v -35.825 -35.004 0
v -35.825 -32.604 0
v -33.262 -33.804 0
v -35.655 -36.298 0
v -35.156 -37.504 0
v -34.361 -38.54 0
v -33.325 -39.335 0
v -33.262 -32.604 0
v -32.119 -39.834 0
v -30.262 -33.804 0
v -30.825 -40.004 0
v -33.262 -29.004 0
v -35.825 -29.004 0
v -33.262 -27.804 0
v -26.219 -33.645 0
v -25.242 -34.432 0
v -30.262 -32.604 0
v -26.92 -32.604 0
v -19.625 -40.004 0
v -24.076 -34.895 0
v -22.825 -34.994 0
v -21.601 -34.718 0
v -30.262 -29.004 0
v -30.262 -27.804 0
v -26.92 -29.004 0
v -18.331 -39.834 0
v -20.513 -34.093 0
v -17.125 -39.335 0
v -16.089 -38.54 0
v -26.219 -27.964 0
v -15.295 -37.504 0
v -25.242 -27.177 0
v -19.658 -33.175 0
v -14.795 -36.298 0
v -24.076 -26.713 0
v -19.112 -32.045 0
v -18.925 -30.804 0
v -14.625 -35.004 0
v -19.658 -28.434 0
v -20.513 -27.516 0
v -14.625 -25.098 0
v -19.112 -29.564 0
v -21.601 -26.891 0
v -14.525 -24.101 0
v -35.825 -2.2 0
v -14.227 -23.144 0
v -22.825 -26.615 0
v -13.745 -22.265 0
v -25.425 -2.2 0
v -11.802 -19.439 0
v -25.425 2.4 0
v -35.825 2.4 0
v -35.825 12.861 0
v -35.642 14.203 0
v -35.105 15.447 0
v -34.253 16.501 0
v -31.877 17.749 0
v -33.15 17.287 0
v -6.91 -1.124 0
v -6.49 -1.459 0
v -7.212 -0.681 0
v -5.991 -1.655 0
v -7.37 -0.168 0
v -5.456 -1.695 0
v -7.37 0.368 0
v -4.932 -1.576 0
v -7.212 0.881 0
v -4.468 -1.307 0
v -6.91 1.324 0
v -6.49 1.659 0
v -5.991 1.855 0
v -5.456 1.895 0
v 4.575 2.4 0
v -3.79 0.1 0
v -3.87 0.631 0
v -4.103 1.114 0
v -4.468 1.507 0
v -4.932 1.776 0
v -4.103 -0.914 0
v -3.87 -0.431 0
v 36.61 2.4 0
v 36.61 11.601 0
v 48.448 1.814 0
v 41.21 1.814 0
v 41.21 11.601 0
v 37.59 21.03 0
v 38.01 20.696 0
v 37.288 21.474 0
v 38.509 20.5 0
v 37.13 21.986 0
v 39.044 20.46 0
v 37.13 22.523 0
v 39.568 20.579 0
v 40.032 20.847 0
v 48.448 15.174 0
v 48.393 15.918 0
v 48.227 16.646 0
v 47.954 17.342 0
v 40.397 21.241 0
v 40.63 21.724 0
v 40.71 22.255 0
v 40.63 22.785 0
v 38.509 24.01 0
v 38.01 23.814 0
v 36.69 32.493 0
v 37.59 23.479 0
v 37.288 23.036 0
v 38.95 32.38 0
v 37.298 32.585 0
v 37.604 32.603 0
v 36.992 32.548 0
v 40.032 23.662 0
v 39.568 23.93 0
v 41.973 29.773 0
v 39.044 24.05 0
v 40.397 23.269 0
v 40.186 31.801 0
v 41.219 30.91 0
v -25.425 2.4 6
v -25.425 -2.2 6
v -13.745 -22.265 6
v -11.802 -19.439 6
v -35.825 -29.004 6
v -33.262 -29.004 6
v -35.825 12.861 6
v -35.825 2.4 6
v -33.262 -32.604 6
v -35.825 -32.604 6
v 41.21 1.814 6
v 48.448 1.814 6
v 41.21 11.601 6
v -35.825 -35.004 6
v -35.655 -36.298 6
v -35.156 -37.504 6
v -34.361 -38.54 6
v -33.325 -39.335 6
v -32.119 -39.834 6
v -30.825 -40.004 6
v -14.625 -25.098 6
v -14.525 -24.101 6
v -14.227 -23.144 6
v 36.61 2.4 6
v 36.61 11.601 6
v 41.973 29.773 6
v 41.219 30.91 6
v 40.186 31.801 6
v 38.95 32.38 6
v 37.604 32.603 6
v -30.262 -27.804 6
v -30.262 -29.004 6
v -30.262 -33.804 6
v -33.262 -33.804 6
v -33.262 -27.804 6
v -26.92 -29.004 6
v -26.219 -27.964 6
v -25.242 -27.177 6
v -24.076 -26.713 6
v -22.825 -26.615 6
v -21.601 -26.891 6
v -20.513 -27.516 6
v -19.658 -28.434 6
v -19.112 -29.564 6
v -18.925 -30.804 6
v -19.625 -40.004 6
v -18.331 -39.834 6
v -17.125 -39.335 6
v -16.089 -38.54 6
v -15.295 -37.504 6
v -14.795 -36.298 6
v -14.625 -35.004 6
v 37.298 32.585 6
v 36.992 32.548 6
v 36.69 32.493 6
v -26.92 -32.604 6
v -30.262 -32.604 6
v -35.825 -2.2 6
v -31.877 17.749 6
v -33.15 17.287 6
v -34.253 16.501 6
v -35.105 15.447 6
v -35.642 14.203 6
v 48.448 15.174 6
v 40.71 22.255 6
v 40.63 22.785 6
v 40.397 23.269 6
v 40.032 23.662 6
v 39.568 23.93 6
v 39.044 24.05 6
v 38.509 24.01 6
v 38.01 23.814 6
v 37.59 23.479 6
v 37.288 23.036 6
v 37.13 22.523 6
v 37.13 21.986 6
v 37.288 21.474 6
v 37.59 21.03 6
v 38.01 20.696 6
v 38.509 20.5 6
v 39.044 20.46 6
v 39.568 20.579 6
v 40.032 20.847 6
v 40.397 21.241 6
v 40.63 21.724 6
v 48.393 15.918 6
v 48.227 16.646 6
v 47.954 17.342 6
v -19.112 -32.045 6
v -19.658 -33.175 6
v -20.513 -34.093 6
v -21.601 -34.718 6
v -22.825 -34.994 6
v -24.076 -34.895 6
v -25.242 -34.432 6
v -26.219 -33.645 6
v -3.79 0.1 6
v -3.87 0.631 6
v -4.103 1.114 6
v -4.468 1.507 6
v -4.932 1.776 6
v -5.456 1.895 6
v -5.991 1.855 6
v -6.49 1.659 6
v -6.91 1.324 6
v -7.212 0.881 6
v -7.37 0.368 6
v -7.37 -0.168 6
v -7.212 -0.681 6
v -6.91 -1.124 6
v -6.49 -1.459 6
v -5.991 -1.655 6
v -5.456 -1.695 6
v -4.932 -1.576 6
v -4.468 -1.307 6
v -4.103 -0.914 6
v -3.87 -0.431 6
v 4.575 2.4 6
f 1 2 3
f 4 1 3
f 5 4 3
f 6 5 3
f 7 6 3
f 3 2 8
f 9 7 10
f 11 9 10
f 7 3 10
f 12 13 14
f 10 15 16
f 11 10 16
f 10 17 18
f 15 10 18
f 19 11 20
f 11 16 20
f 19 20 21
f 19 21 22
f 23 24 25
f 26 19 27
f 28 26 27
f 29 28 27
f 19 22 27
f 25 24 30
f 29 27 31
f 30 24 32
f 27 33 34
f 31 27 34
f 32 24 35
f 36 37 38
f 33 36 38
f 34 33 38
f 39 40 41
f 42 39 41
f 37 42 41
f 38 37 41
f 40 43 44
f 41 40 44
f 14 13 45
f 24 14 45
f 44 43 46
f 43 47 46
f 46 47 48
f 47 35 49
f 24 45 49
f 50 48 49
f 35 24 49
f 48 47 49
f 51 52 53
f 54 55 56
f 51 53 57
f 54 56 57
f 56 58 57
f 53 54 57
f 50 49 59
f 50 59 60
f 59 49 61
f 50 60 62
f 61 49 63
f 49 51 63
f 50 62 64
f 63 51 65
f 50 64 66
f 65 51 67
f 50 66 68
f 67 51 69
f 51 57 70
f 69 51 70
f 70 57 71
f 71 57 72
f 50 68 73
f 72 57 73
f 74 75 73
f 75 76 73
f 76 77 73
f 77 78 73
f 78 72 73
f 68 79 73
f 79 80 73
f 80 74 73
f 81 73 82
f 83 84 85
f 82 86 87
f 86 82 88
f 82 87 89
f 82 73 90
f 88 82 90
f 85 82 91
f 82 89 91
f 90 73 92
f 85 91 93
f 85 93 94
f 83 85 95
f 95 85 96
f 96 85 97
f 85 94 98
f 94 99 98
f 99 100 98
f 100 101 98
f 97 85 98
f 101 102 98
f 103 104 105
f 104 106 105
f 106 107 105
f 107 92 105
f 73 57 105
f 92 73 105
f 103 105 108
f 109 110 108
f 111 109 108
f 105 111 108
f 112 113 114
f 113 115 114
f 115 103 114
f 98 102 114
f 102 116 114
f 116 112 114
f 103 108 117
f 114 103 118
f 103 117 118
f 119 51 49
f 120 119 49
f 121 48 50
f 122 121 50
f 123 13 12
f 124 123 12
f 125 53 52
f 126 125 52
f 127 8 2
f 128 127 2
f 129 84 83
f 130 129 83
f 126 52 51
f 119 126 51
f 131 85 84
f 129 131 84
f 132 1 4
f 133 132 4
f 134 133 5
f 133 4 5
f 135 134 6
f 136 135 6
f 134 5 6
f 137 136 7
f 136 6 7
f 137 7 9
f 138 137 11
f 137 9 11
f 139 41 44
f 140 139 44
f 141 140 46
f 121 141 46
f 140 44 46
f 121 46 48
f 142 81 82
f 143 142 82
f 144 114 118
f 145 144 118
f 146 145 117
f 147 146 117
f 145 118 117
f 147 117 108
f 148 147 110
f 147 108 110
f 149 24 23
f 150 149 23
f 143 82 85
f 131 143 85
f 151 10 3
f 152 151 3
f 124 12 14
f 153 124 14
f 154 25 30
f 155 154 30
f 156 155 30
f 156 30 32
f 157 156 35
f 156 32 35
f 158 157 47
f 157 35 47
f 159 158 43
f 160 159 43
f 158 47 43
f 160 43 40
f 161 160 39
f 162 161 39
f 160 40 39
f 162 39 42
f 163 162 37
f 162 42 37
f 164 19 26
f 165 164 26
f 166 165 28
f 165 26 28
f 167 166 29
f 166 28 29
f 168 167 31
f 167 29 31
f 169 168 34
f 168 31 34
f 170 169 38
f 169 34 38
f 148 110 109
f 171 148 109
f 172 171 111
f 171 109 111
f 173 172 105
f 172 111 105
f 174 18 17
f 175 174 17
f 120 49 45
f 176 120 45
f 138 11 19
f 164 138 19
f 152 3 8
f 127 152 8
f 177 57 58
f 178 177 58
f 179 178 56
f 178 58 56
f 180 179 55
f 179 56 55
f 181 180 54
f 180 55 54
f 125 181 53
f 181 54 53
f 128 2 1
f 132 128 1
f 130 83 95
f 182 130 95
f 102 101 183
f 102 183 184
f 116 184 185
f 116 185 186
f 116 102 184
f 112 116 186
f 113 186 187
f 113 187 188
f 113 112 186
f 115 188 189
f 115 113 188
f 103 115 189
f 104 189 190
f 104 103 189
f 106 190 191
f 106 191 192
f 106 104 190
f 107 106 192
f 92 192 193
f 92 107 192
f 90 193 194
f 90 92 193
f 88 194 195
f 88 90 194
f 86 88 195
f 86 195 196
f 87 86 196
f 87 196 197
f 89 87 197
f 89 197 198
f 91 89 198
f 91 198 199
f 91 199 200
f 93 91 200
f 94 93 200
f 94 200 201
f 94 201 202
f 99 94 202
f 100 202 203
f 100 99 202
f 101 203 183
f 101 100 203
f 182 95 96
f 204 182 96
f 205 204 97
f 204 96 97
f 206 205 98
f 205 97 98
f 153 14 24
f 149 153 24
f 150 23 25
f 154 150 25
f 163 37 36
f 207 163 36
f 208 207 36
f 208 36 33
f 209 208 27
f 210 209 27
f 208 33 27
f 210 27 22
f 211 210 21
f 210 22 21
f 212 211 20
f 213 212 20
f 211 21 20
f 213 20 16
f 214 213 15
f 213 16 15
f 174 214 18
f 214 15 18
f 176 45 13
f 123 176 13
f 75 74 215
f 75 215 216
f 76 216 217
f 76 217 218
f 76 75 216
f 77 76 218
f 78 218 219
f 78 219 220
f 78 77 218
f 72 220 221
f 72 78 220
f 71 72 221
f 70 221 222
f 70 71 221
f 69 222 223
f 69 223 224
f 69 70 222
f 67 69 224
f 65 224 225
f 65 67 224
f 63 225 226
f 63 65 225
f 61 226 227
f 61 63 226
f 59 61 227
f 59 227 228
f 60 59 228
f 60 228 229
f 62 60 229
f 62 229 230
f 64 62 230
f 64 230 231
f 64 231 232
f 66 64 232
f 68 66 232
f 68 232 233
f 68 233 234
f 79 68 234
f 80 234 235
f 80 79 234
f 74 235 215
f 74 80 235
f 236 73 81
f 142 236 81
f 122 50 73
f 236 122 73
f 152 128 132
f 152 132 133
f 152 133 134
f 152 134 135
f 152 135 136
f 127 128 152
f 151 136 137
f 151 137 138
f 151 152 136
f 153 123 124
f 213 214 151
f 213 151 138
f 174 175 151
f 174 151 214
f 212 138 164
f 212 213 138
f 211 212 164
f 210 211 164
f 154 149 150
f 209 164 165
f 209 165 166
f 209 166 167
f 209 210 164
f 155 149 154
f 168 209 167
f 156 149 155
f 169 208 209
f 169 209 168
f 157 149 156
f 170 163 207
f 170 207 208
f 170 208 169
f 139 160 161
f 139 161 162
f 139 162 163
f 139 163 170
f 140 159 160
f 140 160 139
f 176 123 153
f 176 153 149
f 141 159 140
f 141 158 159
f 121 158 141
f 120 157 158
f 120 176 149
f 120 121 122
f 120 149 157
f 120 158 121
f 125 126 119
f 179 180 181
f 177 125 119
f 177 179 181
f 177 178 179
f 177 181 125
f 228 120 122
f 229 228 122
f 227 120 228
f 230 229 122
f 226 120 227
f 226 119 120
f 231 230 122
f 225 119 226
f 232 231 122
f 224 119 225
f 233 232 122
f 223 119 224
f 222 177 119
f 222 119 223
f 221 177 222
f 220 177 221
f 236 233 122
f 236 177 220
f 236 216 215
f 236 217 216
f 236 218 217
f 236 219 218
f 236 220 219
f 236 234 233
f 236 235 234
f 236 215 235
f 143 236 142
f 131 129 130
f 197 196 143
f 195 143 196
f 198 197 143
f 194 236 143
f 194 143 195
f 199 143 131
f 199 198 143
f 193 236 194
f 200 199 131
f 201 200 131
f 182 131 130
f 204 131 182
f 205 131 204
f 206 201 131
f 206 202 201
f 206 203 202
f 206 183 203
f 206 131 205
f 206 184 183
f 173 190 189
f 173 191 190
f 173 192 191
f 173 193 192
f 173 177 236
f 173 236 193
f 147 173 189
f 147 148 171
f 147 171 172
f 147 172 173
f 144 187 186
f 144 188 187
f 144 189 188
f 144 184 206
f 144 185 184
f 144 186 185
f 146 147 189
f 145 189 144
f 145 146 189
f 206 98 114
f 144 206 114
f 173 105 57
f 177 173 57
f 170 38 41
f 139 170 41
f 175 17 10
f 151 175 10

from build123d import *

# Parameters (mm, degrees)
F0_R     = 1.8
F1_DEPTH = 6


# Not quite as in the source:
# - a feature names something its author has since deleted; it is built from what else it names


with BuildPart() as f1:
    # F0 (on Top) → F1 (new body)
    with BuildSketch(Plane.XY):
        with BuildLine():
            ThreePointArc((-26.9197331922, -29.0044), (-22.202470707, -26.7069691338), (-18.925, -30.8044))
            ThreePointArc((-18.925, -30.8044), (-22.202470707, -34.9018308662), (-26.9197331922, -32.6044))
            Line((-26.9197331922, -32.6044), (-30.2622788846, -32.6044))
            Line((-30.2622788846, -32.6044), (-30.2622788846, -33.8044))
            Line((-30.2622788846, -33.8044), (-33.2622788846, -33.8044))
            Line((-33.2622788846, -33.8044), (-33.2622788846, -32.6044))
            Line((-33.2622788846, -32.6044), (-35.8254, -32.6044))
            Line((-35.8254, -32.6044), (-35.8254, -35.0044))
            ThreePointArc((-35.8254, -35.0044), (-34.3609339059, -38.5399339059), (-30.8254, -40.0044))
            Line((-30.8254, -40.0044), (-19.625, -40.0044))
            ThreePointArc((-19.625, -40.0044), (-16.0894660941, -38.5399339059), (-14.625, -35.0044))
            Line((-14.625, -35.0044), (-14.625, -25.0977827265))
            ThreePointArc((-14.625, -25.0977827265), (-14.400006794, -23.6147756066), (-13.7452759529, -22.2652350973))
            Line((-13.7452759529, -22.2652350973), (-11.8023123147, -19.4389644026))
            Line((-11.8023123147, -19.4389644026), (4.5746, 2.4))
            Line((4.5746, 2.4), (36.6099, 2.4))
            Line((36.6099, 2.4), (36.6099, 11.6009423509))
            Line((36.6099, 11.6009423509), (37.1099, 11.6009423509))
            Line((37.1099, 11.6009423509), (38.9099, 11.6009423509))
            Line((38.9099, 11.6009423509), (40.7099, 11.6009423509))
            Line((40.7099, 11.6009423509), (41.2099, 11.6009423509))
            Line((41.2099, 11.6009423509), (41.2099, 1.8140082314))
            Line((41.2099, 1.8140082314), (48.4484305441, 1.8140082314))
            Line((48.4484305441, 1.8140082314), (48.4484305441, 15.1736566274))
            ThreePointArc((48.4484305441, 15.1736566274), (48.3232531582, 16.2854589848), (47.9539887514, 17.341592337))
            Line((47.9539887514, 17.341592337), (41.9726020282, 29.7725357096))
            ThreePointArc((41.9726020282, 29.7725357096), (40.1857248711, 31.8008808947), (37.6042192016, 32.6027179373))
            ThreePointArc((37.6042192016, 32.6027179373), (37.1447174672, 32.5688699786), (36.6902824172, 32.4928679158))
            Line((36.6902824172, 32.4928679158), (-31.8765121651, 17.7491195886))
            ThreePointArc((-31.8765121651, 17.7491195886), (-34.7148447435, 16.0028605187), (-35.8254, 12.8608516729))
            Line((-35.8254, 12.8608516729), (-35.8254, 2.4))
            Line((-35.8254, 2.4), (-25.4254, 2.4))
            Line((-25.4254, 2.4), (-25.4254, 1.9))
            Line((-25.4254, 1.9), (-25.4254, -1.7))
            Line((-25.4254, -1.7), (-25.4254, -2.2))
            Line((-25.4254, -2.2), (-35.8254, -2.2))
            Line((-35.8254, -2.2), (-35.8254, -29.0044))
            Line((-35.8254, -29.0044), (-33.2622788846, -29.0044))
            Line((-33.2622788846, -29.0044), (-33.2622788846, -27.8044))
            Line((-33.2622788846, -27.8044), (-30.2622788846, -27.8044))
            Line((-30.2622788846, -27.8044), (-30.2622788846, -29.0044))
            Line((-30.2622788846, -29.0044), (-26.9197331922, -29.0044))
        make_face()
        with Locations((-5.5901, 0.1)):
            Circle(F0_R, mode=Mode.SUBTRACT)
        with Locations((38.9099, 22.2547)):
            Circle(F0_R, mode=Mode.SUBTRACT)
    extrude(amount=F1_DEPTH)


solid = f1.part
